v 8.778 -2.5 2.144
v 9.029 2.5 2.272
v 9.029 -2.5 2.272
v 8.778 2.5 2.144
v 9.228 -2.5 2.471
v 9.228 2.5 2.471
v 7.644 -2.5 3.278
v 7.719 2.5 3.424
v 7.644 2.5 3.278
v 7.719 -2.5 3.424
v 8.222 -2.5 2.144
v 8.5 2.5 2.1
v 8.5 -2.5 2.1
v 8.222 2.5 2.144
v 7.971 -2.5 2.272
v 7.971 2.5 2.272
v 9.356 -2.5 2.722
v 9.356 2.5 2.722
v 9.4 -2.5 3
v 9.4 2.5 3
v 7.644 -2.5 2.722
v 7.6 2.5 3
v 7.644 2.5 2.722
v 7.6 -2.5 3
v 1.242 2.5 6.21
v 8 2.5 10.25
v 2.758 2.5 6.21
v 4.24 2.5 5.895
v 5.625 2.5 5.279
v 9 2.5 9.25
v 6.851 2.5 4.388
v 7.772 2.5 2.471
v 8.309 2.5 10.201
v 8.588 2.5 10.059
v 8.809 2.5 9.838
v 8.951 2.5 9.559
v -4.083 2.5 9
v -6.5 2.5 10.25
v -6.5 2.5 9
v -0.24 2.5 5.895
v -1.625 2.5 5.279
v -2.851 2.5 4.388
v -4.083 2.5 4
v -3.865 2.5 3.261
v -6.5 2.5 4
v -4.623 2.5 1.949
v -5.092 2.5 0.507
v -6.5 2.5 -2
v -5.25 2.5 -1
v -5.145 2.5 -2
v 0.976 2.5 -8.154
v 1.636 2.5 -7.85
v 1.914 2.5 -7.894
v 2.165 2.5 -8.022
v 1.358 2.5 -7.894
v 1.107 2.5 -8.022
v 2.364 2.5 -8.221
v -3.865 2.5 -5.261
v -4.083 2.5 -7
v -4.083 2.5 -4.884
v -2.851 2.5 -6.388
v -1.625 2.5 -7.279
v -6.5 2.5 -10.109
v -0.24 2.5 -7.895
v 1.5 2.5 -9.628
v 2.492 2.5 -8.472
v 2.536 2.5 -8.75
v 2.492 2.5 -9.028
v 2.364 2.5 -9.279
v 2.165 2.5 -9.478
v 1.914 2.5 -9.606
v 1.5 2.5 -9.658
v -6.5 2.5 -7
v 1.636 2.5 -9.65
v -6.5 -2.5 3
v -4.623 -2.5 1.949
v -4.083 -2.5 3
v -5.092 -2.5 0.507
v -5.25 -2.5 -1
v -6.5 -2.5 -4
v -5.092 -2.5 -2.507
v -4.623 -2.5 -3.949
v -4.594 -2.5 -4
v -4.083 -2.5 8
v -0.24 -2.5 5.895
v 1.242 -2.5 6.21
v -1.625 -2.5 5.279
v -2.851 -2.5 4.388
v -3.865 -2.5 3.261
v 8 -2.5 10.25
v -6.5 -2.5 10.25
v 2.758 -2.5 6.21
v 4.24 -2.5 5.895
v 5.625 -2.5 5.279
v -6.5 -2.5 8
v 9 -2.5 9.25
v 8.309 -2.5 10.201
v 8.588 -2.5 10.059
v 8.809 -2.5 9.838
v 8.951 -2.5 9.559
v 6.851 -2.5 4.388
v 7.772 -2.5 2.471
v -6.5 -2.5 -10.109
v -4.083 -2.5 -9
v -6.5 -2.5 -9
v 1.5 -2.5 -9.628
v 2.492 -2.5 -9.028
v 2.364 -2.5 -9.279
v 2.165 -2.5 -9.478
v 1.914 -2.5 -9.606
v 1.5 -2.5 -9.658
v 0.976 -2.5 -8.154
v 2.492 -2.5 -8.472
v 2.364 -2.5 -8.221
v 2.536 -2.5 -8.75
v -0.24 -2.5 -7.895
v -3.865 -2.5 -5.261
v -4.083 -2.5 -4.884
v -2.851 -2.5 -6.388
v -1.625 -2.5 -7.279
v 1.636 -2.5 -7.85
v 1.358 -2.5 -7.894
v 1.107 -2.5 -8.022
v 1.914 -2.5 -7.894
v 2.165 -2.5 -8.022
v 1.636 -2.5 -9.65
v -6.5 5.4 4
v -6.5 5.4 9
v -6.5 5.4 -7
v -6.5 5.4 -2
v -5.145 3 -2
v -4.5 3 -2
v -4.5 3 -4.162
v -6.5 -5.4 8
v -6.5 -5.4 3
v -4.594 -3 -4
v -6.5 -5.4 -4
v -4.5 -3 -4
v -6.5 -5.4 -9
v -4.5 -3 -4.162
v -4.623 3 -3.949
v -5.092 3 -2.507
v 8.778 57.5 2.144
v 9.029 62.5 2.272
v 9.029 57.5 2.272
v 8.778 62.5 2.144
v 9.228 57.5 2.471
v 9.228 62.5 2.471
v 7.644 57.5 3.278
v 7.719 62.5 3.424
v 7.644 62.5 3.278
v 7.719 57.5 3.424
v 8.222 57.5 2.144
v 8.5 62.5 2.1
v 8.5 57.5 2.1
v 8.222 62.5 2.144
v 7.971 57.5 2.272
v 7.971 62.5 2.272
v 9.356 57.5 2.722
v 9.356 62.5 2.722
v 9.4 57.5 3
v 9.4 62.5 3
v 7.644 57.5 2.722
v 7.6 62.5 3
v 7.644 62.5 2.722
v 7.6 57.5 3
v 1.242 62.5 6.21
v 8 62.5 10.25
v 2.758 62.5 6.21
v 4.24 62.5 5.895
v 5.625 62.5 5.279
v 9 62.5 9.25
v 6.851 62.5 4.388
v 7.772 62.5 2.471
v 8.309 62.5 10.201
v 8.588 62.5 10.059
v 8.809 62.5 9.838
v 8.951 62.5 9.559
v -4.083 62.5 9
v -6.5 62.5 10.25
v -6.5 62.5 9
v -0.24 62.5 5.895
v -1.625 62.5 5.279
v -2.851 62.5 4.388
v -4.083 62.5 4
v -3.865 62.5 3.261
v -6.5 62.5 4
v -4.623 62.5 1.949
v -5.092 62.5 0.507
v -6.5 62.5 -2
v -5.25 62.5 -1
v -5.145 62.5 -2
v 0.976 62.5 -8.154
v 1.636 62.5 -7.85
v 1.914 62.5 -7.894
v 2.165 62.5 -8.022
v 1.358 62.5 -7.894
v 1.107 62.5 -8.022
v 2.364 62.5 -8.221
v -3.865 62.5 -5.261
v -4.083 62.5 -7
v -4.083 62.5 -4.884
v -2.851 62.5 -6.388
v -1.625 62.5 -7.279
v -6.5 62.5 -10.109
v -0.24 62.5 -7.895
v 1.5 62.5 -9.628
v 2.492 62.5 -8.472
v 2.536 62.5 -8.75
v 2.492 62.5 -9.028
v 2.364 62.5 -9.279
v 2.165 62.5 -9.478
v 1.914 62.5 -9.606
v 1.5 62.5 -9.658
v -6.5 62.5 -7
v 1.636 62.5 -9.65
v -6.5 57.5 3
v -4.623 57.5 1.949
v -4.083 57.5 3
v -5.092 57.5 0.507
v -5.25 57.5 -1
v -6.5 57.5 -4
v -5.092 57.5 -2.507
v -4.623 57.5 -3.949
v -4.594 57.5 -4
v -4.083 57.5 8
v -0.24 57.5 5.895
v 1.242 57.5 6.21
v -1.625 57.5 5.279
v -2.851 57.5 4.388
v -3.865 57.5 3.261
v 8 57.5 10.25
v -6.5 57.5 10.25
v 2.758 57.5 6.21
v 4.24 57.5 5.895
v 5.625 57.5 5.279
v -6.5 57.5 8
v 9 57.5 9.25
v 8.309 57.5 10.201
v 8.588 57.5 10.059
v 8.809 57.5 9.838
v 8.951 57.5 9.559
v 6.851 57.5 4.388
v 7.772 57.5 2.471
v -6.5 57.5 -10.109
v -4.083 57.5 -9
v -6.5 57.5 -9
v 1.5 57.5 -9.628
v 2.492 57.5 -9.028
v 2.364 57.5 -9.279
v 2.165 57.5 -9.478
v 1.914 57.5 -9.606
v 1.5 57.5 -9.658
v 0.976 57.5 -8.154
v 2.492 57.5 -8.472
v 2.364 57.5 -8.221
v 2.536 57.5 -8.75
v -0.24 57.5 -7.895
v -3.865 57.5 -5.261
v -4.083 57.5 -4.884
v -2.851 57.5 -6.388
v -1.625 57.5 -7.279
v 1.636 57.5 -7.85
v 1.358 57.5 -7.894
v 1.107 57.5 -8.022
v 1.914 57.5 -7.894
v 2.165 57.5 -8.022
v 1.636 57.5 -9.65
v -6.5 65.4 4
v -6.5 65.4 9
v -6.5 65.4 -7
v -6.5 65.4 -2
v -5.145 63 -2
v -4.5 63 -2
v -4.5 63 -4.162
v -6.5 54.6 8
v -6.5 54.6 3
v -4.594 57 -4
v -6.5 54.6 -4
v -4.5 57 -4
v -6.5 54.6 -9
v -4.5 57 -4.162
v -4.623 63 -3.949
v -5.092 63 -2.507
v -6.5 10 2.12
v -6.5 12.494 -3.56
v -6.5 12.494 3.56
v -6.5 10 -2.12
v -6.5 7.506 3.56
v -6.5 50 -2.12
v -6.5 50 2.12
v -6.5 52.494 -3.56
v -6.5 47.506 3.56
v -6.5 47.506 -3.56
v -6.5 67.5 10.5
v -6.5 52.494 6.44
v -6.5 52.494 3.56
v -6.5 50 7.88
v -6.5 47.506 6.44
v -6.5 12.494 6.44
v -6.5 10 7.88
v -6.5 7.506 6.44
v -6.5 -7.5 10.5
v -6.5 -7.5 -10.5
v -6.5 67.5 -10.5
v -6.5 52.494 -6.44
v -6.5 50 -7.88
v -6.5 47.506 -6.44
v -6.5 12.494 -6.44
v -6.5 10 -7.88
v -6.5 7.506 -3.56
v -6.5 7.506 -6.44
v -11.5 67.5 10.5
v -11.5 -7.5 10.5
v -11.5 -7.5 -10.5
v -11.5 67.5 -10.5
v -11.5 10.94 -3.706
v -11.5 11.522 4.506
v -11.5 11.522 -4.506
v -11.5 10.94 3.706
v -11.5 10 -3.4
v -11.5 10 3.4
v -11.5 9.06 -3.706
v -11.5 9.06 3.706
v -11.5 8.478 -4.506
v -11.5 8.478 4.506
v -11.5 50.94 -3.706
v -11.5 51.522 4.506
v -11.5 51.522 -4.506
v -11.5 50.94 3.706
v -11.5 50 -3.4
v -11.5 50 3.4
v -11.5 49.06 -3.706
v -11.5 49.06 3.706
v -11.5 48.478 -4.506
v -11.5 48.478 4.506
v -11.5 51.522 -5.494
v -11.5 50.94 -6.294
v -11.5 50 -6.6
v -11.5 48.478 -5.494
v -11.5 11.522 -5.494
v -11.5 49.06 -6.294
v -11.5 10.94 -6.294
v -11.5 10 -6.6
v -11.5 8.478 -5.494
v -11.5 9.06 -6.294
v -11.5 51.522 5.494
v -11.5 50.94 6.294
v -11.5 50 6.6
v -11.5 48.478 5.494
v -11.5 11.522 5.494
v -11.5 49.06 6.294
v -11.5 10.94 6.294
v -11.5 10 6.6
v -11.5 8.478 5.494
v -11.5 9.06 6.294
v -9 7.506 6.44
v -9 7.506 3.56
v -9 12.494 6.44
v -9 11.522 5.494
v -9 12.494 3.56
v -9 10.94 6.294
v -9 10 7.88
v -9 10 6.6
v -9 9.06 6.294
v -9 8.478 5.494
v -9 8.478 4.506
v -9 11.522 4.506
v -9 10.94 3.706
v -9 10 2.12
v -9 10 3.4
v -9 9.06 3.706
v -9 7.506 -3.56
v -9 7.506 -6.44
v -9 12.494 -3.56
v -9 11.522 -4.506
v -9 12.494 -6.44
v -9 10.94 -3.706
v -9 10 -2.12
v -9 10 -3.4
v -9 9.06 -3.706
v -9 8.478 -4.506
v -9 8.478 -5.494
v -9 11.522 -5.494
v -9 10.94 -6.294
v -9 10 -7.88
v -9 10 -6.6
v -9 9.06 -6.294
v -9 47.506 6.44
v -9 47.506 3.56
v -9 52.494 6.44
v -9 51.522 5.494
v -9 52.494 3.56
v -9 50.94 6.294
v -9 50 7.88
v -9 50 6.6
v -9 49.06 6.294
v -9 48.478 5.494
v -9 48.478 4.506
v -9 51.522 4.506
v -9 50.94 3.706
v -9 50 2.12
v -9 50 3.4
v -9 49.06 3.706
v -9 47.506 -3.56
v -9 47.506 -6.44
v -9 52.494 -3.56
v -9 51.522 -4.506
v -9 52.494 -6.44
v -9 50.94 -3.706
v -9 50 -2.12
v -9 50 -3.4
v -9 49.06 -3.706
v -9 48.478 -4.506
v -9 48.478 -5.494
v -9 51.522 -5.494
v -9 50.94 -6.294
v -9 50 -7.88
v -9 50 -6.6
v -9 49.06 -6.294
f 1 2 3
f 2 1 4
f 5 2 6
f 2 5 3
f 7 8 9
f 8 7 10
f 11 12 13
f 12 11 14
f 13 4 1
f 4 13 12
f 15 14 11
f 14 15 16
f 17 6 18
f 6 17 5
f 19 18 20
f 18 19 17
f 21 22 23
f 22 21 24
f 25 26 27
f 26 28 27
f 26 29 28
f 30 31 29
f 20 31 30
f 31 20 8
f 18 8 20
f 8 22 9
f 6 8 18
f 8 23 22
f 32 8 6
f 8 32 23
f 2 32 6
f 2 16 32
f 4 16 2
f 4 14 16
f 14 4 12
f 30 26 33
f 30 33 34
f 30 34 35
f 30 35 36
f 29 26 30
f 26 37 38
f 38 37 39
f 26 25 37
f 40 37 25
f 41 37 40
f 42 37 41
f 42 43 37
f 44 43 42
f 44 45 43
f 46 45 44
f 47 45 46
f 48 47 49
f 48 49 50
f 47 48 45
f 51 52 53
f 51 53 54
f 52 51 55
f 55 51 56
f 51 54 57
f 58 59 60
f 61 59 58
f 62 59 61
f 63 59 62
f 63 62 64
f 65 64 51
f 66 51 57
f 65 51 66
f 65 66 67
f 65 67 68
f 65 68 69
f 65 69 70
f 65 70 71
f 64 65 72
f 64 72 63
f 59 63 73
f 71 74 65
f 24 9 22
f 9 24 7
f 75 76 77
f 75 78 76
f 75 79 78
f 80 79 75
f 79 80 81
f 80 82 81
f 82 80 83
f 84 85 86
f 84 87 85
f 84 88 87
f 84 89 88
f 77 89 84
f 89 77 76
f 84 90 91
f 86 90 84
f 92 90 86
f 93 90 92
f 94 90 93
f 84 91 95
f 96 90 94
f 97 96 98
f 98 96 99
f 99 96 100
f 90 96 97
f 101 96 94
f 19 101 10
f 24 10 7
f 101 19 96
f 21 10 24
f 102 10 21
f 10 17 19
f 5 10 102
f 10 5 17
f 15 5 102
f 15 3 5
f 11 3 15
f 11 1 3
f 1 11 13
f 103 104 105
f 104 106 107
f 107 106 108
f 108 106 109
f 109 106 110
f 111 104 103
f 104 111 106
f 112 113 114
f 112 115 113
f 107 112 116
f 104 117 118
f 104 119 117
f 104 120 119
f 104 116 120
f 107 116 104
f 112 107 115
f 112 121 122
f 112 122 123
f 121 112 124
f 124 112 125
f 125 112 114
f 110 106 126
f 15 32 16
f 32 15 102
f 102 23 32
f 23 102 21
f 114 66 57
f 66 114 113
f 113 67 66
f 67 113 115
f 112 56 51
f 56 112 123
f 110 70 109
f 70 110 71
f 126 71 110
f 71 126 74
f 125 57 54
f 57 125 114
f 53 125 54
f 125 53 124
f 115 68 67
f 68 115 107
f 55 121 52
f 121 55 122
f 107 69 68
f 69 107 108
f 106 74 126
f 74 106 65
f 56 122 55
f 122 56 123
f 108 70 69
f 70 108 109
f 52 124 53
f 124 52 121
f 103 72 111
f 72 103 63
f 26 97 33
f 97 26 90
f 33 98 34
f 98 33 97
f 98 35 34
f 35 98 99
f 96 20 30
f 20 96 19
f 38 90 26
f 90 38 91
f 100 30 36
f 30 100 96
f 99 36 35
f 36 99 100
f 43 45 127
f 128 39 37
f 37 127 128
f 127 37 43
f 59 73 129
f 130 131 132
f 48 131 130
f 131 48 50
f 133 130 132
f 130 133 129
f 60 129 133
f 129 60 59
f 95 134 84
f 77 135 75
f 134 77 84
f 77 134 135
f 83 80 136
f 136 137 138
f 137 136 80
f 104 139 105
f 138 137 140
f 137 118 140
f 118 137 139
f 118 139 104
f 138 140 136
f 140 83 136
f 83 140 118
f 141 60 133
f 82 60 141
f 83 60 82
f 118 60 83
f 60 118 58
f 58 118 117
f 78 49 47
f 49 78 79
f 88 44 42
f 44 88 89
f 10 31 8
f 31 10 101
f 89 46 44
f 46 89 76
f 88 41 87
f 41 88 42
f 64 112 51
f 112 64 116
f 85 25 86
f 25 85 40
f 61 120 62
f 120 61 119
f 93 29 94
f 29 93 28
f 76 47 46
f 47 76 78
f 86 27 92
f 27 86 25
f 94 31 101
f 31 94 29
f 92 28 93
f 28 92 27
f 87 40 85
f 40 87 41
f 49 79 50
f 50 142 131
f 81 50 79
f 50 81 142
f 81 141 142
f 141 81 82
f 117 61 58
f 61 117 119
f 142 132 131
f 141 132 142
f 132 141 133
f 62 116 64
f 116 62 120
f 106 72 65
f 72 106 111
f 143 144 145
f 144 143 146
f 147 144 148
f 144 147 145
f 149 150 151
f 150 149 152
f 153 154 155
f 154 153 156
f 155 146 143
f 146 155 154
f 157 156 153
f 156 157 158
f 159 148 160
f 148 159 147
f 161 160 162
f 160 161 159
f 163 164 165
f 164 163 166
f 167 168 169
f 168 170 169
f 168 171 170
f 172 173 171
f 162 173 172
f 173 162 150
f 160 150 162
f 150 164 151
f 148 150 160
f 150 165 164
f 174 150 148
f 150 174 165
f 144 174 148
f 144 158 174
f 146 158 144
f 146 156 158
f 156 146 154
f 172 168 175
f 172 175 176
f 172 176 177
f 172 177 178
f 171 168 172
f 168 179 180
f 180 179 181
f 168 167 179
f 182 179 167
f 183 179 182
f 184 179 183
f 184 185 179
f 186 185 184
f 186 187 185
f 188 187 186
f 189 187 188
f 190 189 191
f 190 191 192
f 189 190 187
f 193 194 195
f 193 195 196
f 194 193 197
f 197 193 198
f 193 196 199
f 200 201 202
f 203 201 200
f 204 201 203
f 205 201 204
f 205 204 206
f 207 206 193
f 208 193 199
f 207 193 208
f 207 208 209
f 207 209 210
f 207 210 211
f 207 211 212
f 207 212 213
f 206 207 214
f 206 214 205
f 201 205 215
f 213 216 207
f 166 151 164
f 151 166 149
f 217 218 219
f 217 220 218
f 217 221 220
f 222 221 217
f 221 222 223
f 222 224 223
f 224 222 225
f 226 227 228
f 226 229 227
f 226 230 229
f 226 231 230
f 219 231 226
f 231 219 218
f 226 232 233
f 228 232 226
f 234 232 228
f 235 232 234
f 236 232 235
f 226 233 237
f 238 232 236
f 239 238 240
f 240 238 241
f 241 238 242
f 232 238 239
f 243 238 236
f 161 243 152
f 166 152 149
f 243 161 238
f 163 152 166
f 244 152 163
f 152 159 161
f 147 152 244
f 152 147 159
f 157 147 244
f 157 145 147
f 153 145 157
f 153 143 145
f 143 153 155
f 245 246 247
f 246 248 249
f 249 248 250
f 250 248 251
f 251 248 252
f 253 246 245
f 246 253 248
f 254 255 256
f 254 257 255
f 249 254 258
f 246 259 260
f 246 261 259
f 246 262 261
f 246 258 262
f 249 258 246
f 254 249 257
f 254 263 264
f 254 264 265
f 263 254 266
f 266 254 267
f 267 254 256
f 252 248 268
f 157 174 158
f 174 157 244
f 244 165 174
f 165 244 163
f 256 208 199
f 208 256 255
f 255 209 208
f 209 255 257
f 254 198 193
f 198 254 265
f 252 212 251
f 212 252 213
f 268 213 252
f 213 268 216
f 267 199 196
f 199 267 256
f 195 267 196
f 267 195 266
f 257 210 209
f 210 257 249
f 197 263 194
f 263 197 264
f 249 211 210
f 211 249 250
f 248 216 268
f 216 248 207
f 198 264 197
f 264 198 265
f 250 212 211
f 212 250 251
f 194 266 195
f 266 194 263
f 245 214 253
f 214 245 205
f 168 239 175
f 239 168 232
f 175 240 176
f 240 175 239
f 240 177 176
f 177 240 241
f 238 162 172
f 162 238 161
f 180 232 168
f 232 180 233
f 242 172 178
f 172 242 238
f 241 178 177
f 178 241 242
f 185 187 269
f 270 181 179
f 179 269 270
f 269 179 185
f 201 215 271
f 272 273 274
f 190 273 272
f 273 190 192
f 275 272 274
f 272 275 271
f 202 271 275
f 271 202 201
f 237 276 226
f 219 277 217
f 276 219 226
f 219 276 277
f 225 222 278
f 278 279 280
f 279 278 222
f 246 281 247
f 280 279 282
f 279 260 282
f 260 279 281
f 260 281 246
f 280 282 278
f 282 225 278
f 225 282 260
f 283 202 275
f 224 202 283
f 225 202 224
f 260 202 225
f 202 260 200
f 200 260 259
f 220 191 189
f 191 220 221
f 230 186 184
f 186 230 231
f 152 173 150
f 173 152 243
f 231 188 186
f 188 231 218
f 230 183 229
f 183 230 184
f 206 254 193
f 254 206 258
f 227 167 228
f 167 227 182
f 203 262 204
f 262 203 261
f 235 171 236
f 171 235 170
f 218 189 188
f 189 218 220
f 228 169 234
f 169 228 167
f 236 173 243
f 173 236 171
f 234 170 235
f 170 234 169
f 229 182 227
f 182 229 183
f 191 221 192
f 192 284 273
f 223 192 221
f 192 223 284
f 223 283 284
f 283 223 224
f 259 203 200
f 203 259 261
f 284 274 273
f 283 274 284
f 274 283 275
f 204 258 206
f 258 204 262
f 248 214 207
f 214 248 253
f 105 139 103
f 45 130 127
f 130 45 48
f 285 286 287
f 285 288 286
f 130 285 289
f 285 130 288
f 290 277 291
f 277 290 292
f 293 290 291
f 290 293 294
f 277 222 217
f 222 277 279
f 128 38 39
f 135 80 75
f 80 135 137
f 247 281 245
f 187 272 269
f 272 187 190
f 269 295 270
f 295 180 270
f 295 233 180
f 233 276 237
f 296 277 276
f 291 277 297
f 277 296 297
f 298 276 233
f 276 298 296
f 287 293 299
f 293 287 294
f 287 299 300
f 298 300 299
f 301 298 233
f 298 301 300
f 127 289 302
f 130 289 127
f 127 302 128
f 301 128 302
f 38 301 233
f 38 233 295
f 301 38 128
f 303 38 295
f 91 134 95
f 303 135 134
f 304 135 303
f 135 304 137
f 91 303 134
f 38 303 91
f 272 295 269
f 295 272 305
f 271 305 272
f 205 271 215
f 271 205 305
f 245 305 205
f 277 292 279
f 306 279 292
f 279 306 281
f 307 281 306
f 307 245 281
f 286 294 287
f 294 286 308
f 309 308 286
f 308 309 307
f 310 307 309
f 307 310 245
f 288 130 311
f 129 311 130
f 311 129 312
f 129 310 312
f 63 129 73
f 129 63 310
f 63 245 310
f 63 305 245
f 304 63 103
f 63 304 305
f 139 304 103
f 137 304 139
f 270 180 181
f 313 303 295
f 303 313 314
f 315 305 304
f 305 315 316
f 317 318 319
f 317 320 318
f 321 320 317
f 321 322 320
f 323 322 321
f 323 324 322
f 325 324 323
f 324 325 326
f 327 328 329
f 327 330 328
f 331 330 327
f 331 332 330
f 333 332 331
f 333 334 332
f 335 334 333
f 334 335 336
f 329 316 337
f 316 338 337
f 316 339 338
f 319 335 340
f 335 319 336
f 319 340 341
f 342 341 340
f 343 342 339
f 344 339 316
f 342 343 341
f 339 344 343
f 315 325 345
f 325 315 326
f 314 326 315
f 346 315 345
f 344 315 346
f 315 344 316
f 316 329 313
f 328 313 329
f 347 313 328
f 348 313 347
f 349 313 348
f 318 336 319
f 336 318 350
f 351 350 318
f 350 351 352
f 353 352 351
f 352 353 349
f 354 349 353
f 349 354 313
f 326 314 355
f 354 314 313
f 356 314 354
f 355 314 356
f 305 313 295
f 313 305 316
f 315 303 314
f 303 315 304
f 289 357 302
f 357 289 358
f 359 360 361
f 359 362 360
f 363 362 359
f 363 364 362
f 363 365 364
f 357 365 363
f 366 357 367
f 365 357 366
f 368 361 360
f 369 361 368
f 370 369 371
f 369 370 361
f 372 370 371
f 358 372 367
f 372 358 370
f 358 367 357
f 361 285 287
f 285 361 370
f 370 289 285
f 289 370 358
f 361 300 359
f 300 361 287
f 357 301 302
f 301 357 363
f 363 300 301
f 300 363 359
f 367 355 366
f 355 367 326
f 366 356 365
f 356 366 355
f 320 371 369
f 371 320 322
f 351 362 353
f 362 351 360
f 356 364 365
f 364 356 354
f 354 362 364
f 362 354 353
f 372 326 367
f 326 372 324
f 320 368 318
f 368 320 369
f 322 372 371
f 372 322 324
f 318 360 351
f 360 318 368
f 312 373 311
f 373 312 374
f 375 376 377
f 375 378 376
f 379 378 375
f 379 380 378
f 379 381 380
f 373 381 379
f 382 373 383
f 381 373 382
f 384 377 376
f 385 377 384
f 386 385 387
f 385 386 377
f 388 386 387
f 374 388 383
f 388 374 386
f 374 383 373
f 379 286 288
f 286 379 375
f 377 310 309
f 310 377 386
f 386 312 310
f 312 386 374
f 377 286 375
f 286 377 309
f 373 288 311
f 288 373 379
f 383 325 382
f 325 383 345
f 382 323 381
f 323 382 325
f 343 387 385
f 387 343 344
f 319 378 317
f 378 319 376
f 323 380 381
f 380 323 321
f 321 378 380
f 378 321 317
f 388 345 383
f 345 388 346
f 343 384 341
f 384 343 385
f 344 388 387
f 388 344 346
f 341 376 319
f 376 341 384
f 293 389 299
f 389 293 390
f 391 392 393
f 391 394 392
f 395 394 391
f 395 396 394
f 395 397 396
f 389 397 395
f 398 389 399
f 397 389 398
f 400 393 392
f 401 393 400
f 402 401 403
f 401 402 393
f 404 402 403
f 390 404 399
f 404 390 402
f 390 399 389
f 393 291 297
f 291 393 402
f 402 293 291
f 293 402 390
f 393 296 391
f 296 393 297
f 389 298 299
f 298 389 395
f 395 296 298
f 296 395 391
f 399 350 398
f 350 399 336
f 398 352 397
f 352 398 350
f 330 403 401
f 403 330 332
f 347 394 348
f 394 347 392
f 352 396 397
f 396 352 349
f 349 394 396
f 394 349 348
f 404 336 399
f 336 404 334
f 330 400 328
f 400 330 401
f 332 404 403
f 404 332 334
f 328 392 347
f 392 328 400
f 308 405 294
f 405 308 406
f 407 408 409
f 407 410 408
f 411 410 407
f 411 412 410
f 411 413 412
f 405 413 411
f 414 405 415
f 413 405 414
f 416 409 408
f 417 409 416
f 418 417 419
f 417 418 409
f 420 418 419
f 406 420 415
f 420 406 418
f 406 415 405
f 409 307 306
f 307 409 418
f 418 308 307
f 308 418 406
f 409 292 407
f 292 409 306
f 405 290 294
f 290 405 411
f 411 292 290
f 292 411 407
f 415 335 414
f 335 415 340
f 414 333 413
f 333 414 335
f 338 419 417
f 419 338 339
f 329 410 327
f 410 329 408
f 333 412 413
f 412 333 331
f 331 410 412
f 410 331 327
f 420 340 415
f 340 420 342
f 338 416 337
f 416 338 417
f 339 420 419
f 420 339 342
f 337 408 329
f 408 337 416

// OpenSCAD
// 0 = all, 1=only the bracket
export_set = 0;

laser_pen_diam = 14.5;

holder_spacing=60;

holder_len = 18;
holder_width = 5;
holder_height = laser_pen_diam + 4;

holder_back_len =  holder_spacing + holder_width + 10;

module pad(l,h,z) {
    linear_extrude(height = z, center = false, convexity = 10, twist = 0) {
        polygon(points = [ [0,0], [0,l], [h,0]]);
    }
}

module screw_hole(y,z) {
    translate(v=[-9,y,z])
        rotate(a=90, v=[0,1,0]){
            cylinder(h=2.5, d=1.8*3.2, $fn=6);
        }
    translate(v=[-20,y,z]){
        rotate(a=90, v=[0,1,0]){
            cylinder(h=30, d=3.2,$fn=10);
        }            
    }
}

module pico_haut(){
translate(v=[holder_len/2,0,5]){
                    rotate(a=90, v=[1,0,0]) {
                        cylinder(h=holder_width,
                                        d=2,center=true, $fn=20);
                    }
                }
}

module start_stop_cyl(){
        translate(v=[holder_len/2-.5, 0, 3]){
            rotate(a=90, v=[1,0,0]) {
                cylinder(h=holder_width,
                                d=1.8,center=true, $fn=20);
            }
        }
        translate(v=[holder_len/11, 0, -holder_height/2+.5]){
            rotate(a=90, v=[1,0,0]) {
                cylinder(h=holder_width,
                                d=1.8,center=true, $fn=20);
            }
        }
}

module holder_base(){
    union(){
        hull(){
            translate(v=[holder_len/2-1,  0, holder_height/2]){
                rotate(a=90, v=[1,0,0]) {
                    cylinder(h=holder_width,
                                    d=2,center=true, $fn=20);
                }
            }     
             translate(v=[-holder_len/2,  0, holder_height/2,]){
                rotate(a=90, v=[1,0,0]) {
                    cylinder(h=holder_width,
                                    d=2,center=true, $fn=20);
                }
            }
            translate(v=[-holder_len/2, 0, -holder_height/2]){
                rotate(a=90, v=[1,0,0]) {
                    cylinder(h=holder_width,
                                    d=2,center=true, $fn=20);
                }
            }
            start_stop_cyl();
        }
        translate(v=[-7,0,4])
            pad(6,5,5);
        
          translate(v=[-7,0,-7])
            pad(6,5,5);
        
             rotate(a=180, v=[1,0,0])
                  translate(v=[-7,0,-8])
            pad(6,5,5);          
        
        rotate(a=180, v=[1,0,0])
                  translate(v=[-7,0,4])
            pad(6,5,5);          
    }
}
        



module holder(pos_y) {
    translate(v=[0,pos_y,0]){
        union(){
            difference() {
                holder_base();
                
                translate(v=[2,0,-1]){
                    rotate(a=90, v=[1,0,0] ){
                        cylinder(h = holder_width+1,
                                        d = laser_pen_diam, 
                                        center = true,
                                        $fn=30);
                    }
                }
                translate(v=[holder_len/3,0,-holder_height/4]) {
                    cube([holder_len/2,
                                holder_width+1,
                                holder_height/2+5],
                                center=true);
                }
            }
            start_stop_cyl();
            
        }
    }
}

difference(){
    union(){
        holder(0);
        if (export_set == 0) {
            holder(holder_spacing);
            translate(v=[-holder_len/2,holder_spacing/2,0]){
                cube([5,holder_back_len,21], center=true);
            }
        }
    //    
    //    translate(v=[-holder_len/2,holder_spacing/2,-3]){
    //        cube([5,holder_spacing+holder_width,20], center=true);
    //    }
    }
    screw_hole(10,5);
    screw_hole(10,-5);
    screw_hole(50,5);
    screw_hole(50,-5);
}
